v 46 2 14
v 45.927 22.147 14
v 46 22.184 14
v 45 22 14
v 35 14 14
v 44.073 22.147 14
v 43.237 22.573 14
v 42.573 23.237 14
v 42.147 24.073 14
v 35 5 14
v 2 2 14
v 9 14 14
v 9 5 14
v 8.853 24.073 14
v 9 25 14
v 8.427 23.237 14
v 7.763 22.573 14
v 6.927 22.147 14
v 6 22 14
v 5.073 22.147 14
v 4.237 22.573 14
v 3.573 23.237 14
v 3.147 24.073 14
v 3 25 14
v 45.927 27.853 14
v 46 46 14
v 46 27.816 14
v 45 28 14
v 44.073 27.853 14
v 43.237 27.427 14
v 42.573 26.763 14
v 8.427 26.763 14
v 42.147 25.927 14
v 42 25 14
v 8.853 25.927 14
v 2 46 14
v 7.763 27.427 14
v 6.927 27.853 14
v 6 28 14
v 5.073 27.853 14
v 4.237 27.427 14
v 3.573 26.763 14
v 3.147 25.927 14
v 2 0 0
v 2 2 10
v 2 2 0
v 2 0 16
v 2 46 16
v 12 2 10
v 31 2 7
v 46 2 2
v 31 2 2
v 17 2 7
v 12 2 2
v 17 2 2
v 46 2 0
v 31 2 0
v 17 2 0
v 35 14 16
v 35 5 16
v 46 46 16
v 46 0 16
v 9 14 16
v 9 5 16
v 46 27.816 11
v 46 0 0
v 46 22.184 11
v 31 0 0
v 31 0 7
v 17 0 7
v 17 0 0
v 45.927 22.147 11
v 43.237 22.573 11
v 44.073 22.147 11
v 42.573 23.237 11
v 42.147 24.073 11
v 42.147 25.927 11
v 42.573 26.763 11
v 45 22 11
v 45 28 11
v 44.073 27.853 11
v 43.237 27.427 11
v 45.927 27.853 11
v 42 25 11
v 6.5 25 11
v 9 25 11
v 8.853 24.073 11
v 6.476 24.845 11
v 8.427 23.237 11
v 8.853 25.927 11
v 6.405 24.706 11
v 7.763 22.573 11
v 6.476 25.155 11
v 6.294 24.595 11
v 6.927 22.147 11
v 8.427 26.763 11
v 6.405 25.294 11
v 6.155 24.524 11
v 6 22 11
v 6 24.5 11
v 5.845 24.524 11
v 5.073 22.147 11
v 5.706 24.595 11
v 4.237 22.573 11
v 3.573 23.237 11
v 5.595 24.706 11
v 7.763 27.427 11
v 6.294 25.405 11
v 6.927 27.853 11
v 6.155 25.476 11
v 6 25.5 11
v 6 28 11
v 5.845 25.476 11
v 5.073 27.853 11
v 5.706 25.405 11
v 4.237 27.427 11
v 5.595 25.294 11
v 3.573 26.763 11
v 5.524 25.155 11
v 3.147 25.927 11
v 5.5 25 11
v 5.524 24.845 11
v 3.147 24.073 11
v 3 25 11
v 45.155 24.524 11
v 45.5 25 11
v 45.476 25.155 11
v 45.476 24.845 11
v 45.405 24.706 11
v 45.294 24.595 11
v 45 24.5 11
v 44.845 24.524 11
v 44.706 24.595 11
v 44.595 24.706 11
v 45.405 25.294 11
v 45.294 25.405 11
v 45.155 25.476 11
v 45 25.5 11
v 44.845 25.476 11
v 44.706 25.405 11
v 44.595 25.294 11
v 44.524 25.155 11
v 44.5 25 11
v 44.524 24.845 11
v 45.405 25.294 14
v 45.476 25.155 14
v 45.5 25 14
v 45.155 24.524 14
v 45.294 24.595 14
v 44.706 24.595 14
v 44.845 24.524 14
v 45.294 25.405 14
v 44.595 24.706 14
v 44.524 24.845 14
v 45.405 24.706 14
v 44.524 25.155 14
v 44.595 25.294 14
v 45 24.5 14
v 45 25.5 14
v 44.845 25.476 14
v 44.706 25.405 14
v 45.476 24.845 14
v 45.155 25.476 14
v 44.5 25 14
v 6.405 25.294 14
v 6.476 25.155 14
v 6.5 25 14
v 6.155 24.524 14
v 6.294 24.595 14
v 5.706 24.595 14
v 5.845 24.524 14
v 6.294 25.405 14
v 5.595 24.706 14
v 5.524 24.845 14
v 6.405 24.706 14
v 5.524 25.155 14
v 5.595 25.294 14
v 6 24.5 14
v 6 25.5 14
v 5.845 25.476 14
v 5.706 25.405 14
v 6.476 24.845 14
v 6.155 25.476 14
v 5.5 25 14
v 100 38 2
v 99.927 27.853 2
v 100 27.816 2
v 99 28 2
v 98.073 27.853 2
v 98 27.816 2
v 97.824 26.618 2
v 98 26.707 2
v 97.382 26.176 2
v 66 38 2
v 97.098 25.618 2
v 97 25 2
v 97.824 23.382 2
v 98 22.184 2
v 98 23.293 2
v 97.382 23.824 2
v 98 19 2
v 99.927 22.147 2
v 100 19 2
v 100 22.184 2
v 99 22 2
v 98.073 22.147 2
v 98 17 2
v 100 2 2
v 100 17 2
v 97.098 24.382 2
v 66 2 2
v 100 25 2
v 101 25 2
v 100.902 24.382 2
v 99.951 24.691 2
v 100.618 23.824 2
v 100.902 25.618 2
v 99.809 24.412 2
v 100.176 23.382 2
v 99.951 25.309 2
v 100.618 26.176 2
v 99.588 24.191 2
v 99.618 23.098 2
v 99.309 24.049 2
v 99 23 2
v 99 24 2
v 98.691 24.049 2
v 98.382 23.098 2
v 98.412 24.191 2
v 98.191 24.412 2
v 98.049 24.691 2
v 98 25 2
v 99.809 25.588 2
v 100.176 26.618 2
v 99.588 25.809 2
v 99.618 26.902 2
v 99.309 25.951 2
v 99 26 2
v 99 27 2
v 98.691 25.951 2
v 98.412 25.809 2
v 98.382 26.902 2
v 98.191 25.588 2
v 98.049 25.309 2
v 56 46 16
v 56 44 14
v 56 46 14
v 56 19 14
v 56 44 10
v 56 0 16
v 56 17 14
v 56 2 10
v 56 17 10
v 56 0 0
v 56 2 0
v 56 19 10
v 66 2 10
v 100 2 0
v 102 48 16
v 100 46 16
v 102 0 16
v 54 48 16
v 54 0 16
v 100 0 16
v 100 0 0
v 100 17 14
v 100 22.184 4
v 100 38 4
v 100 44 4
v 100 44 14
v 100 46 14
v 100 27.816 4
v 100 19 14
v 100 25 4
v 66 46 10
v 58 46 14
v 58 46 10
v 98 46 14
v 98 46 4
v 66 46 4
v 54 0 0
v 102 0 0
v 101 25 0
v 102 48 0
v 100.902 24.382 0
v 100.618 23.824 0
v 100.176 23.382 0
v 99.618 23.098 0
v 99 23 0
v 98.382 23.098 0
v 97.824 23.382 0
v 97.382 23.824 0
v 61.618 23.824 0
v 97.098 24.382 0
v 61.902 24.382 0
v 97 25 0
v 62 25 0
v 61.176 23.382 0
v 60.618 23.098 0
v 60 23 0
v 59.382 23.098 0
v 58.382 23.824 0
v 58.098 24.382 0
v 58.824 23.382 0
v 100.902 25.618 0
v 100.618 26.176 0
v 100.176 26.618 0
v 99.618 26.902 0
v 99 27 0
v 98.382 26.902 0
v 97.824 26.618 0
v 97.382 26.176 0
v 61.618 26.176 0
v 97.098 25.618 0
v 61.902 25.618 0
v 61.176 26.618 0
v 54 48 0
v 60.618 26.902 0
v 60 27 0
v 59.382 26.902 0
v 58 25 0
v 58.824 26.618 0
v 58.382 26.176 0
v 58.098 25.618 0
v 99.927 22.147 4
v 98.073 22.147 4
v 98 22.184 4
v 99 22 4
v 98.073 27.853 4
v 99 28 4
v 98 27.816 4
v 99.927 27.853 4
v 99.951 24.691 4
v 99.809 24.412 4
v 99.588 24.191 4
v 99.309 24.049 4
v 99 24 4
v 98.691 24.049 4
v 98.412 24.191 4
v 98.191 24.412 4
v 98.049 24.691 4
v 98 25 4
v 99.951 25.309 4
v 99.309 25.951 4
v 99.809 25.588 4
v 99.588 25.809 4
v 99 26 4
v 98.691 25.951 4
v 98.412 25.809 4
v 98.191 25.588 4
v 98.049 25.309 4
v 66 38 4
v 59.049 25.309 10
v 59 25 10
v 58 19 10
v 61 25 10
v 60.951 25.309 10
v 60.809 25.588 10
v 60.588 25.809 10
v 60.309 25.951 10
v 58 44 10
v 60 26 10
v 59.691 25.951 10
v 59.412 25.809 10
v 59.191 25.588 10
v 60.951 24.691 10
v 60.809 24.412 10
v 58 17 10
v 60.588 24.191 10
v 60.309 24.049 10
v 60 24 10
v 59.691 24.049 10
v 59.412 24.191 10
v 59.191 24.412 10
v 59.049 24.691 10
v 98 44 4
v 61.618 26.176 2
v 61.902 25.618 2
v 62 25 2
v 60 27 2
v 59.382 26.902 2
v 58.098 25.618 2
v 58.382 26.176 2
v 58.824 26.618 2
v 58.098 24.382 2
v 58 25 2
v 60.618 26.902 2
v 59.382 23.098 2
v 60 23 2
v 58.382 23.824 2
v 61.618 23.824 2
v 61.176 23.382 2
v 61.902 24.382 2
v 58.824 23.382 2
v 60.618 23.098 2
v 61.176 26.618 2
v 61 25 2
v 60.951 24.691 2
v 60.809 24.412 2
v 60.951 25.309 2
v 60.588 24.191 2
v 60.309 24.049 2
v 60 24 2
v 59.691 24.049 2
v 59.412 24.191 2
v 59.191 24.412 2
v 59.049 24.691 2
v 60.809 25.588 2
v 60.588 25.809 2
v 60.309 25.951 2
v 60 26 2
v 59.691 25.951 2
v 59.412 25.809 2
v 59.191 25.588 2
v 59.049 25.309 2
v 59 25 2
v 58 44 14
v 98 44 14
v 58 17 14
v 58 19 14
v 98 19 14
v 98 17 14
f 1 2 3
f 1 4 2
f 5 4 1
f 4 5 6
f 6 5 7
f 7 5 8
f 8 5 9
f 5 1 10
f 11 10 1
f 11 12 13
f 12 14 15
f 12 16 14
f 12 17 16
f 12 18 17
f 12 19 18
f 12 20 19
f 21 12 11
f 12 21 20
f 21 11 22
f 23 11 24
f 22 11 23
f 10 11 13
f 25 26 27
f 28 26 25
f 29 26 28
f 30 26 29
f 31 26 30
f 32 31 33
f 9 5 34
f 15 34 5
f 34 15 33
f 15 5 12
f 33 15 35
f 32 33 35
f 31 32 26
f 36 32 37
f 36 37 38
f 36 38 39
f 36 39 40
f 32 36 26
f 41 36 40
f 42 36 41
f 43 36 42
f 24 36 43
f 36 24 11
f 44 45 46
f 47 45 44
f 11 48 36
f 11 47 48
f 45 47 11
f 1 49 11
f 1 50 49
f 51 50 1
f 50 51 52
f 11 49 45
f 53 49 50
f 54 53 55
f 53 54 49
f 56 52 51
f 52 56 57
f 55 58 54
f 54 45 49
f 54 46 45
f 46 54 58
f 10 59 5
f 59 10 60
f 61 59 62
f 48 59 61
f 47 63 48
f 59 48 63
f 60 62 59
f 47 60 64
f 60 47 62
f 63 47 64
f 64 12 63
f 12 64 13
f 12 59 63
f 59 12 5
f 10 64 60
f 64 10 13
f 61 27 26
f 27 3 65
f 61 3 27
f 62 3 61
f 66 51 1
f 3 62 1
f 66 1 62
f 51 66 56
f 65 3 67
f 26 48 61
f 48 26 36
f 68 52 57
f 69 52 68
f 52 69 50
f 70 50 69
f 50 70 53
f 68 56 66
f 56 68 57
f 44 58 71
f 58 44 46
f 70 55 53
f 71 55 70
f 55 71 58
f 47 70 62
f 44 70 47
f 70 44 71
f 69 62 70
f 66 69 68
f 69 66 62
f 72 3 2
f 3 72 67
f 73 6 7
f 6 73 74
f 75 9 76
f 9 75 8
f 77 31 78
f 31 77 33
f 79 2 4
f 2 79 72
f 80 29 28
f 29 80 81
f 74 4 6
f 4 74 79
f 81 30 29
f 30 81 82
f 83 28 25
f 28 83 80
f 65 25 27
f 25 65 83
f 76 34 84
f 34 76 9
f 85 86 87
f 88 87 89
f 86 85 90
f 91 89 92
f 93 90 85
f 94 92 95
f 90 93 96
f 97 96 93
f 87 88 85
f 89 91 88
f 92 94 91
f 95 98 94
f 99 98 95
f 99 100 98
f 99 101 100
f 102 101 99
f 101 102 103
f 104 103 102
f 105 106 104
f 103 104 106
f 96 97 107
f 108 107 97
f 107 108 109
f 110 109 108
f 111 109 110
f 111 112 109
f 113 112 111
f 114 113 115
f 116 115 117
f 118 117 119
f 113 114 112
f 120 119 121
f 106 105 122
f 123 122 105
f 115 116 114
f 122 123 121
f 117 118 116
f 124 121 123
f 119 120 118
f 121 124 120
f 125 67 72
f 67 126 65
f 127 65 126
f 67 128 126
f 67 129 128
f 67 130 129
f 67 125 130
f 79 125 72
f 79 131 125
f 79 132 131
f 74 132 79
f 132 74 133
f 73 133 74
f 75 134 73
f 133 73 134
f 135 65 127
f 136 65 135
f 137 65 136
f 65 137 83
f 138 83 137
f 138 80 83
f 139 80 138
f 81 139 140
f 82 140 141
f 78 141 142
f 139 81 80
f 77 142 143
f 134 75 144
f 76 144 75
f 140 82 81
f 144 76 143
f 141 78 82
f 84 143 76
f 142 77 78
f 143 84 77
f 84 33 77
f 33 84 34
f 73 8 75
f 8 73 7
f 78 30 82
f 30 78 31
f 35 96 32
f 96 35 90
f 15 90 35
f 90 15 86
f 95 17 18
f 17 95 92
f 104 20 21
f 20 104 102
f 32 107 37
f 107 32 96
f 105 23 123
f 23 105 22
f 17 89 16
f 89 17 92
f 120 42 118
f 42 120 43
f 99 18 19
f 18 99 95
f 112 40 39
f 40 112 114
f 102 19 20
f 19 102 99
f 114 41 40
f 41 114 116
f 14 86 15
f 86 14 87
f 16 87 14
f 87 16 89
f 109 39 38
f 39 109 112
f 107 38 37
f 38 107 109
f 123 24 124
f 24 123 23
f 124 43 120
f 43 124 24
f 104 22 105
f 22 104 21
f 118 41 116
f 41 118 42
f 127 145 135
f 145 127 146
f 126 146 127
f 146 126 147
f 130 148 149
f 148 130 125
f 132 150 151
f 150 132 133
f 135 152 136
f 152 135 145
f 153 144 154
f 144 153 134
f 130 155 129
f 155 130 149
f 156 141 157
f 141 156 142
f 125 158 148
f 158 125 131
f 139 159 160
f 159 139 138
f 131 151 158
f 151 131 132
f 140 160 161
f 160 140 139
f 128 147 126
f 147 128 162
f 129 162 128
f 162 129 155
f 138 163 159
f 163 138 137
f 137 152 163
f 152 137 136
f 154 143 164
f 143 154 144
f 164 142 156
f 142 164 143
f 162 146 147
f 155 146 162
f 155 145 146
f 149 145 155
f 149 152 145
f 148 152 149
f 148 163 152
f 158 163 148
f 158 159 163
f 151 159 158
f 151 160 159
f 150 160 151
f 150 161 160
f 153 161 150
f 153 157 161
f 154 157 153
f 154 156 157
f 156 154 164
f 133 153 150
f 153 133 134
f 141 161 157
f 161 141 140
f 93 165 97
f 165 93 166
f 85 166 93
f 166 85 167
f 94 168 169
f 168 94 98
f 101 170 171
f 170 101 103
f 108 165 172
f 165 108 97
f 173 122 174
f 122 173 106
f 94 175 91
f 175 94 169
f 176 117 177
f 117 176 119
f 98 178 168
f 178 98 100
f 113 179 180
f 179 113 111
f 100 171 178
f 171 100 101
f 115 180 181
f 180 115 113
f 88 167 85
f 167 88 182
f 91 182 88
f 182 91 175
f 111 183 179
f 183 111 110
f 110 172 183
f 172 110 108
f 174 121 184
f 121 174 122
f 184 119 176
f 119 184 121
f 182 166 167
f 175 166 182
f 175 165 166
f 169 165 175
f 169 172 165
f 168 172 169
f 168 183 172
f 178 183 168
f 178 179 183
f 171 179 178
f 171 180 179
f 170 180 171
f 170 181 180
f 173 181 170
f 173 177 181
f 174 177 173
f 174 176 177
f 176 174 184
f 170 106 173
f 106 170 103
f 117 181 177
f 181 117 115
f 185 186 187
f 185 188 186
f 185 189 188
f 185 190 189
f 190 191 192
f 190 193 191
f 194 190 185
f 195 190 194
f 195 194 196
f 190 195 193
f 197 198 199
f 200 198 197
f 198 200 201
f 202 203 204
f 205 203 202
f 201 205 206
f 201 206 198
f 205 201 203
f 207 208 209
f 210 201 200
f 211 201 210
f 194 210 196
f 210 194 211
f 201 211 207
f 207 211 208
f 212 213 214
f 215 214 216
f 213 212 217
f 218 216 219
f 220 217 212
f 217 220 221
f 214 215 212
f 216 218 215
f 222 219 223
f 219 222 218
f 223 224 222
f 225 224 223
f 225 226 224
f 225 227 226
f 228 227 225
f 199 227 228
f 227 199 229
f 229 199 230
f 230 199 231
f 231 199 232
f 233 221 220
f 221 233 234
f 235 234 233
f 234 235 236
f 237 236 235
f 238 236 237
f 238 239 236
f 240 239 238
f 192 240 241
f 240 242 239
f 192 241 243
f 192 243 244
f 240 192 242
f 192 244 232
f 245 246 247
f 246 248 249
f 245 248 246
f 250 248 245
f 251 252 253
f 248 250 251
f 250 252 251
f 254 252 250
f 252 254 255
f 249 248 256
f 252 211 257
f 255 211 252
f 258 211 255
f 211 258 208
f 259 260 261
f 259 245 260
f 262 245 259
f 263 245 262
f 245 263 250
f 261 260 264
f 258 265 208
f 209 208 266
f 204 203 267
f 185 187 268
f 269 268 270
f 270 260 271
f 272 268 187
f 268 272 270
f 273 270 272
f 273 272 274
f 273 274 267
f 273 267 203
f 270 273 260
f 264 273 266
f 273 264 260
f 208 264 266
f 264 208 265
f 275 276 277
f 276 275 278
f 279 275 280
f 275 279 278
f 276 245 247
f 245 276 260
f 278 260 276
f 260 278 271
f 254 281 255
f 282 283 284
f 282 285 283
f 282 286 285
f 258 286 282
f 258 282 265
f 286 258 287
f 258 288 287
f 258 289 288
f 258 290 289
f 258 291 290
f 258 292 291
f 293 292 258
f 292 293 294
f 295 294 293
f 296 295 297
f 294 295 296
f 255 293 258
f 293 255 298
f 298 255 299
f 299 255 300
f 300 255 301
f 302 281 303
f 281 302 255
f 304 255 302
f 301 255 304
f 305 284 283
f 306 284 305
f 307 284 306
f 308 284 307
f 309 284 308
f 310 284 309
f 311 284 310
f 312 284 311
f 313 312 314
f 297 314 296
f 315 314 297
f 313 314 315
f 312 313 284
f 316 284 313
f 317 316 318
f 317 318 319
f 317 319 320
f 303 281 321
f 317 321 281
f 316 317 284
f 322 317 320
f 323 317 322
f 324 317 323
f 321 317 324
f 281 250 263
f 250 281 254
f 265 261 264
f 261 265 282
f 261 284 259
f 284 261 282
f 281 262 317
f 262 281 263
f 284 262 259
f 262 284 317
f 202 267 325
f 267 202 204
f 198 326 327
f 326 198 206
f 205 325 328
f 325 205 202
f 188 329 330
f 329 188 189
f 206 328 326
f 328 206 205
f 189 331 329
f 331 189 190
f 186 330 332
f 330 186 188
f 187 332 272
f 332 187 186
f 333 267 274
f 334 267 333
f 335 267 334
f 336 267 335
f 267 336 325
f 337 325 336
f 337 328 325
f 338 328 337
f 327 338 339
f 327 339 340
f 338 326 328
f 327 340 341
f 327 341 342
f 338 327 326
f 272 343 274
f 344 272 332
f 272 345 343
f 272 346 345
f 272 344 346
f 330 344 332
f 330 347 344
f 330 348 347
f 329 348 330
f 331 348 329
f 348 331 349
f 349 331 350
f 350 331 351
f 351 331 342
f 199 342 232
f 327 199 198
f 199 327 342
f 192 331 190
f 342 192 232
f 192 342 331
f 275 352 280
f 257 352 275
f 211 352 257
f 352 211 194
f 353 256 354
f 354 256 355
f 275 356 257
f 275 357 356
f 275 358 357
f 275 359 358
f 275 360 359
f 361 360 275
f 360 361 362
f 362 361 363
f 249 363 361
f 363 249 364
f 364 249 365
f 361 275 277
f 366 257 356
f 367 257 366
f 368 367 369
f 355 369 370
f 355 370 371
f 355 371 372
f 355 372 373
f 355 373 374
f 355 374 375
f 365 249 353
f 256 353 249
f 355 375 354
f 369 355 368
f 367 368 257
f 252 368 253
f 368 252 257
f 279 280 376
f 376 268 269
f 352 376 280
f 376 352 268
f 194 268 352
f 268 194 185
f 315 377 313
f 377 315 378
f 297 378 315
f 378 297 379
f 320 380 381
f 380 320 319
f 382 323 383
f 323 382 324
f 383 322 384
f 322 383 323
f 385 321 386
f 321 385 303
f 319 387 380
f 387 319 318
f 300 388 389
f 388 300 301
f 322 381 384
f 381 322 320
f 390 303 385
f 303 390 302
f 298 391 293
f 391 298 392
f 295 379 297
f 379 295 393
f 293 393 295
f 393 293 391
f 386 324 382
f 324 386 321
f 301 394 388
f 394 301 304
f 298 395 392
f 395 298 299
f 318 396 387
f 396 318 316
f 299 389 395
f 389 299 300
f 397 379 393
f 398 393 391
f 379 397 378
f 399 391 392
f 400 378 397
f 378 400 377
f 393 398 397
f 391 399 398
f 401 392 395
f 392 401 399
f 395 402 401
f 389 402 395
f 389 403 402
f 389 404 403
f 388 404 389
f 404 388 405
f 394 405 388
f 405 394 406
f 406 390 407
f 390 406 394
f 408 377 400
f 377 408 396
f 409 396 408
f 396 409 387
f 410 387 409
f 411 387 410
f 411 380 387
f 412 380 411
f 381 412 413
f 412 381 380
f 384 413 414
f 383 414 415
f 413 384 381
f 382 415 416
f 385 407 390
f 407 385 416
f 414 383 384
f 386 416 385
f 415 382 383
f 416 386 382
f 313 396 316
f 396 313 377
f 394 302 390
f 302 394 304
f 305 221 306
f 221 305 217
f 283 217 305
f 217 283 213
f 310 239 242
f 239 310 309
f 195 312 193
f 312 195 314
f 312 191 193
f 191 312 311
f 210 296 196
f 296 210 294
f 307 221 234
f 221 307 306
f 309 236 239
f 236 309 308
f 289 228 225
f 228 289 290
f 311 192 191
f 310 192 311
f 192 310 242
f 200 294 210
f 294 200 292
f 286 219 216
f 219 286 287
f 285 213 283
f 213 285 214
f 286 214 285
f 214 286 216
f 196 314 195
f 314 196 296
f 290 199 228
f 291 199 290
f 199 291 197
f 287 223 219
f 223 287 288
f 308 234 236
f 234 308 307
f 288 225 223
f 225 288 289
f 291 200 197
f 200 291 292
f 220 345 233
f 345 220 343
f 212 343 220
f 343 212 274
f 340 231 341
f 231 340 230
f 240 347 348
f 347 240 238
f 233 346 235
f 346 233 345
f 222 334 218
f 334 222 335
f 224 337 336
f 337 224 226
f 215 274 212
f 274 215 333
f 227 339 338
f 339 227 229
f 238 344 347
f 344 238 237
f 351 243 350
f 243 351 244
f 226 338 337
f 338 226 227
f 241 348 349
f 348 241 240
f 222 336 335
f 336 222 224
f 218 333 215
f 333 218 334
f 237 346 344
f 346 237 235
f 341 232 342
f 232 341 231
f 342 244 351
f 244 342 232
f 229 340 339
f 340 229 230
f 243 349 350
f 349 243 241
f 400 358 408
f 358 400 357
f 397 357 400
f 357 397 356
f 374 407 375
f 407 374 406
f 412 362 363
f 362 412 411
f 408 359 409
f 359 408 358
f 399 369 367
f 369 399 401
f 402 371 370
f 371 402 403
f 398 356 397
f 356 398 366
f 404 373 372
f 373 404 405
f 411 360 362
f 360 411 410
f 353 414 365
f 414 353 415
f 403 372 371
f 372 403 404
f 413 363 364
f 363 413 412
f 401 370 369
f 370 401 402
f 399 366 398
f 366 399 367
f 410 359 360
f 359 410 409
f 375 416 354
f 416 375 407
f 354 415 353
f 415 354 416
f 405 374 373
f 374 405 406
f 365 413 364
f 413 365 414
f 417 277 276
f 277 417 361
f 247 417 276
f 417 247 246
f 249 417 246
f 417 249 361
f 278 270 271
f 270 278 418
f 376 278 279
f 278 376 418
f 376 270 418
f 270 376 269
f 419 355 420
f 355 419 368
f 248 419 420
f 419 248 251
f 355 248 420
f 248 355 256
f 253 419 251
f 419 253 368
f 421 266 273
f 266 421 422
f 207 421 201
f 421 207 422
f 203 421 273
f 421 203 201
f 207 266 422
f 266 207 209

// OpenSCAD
module complete(){
    difference(){
        union(){ 
            difference(){
                cube([48,48,16]);
                union(){
                    translate([2,2,2]) cube([43,36,12]);
                    translate([2+7,2+3,14]) cube([26,9,2]);
                    translate([2,2,2]) cube([44,44,12]);
                    translate([17,0,0]) cube([14,2,7]);
                }
            }
            cube([12,48,10]);
            translate([0,38,2]) cube([48,10,2]);
            difference(){
                translate([45,25,2]) cylinder(h=2,d=6,$fn=20);
                translate([2,2,2]) cube([42,36,12]);
            }
            translate([45,25,11]) cylinder(h=3,d=6,$fn=20);
            translate([6,25,11]) cylinder(h=3,d=6,$fn=20);
        }
        union(){
             translate([6,25,0]) cylinder(h=2,d=4,$fn=20);
             translate([45,25,0]) cylinder(h=2,d=4,$fn=20);
             translate([45,25,2]) cylinder(h=2,d=2,$fn=20);
             translate([6,25,2]) cylinder(h=8,d=2,$fn=20);
             translate([45,25,11]) cylinder(h=3,d=1,$fn=20); 
             translate([6,25,11]) cylinder(h=3,d=1,$fn=20); 
        }
    }
};

intersection(){
    complete();
    union(){
        translate([2,2,11]) cube([44,44,5]);
        translate([2,0,0]) cube([44,2,16]);

    }
}

translate([54,0,0]){
    union(){
        difference(){
            complete();
            union(){
                translate([2,2,11]) cube([44,44,5]);
                translate([2,0,0]) cube([44,2,16]);
            }
        }
        translate([0,44,0]) cube([4,4,14]);
        translate([44,44,0]) cube([4,4,14]);
        translate([0,17,]) cube([4,2,14]);
        translate([44,17,0]) cube([4,2,14]);        
    }
}
